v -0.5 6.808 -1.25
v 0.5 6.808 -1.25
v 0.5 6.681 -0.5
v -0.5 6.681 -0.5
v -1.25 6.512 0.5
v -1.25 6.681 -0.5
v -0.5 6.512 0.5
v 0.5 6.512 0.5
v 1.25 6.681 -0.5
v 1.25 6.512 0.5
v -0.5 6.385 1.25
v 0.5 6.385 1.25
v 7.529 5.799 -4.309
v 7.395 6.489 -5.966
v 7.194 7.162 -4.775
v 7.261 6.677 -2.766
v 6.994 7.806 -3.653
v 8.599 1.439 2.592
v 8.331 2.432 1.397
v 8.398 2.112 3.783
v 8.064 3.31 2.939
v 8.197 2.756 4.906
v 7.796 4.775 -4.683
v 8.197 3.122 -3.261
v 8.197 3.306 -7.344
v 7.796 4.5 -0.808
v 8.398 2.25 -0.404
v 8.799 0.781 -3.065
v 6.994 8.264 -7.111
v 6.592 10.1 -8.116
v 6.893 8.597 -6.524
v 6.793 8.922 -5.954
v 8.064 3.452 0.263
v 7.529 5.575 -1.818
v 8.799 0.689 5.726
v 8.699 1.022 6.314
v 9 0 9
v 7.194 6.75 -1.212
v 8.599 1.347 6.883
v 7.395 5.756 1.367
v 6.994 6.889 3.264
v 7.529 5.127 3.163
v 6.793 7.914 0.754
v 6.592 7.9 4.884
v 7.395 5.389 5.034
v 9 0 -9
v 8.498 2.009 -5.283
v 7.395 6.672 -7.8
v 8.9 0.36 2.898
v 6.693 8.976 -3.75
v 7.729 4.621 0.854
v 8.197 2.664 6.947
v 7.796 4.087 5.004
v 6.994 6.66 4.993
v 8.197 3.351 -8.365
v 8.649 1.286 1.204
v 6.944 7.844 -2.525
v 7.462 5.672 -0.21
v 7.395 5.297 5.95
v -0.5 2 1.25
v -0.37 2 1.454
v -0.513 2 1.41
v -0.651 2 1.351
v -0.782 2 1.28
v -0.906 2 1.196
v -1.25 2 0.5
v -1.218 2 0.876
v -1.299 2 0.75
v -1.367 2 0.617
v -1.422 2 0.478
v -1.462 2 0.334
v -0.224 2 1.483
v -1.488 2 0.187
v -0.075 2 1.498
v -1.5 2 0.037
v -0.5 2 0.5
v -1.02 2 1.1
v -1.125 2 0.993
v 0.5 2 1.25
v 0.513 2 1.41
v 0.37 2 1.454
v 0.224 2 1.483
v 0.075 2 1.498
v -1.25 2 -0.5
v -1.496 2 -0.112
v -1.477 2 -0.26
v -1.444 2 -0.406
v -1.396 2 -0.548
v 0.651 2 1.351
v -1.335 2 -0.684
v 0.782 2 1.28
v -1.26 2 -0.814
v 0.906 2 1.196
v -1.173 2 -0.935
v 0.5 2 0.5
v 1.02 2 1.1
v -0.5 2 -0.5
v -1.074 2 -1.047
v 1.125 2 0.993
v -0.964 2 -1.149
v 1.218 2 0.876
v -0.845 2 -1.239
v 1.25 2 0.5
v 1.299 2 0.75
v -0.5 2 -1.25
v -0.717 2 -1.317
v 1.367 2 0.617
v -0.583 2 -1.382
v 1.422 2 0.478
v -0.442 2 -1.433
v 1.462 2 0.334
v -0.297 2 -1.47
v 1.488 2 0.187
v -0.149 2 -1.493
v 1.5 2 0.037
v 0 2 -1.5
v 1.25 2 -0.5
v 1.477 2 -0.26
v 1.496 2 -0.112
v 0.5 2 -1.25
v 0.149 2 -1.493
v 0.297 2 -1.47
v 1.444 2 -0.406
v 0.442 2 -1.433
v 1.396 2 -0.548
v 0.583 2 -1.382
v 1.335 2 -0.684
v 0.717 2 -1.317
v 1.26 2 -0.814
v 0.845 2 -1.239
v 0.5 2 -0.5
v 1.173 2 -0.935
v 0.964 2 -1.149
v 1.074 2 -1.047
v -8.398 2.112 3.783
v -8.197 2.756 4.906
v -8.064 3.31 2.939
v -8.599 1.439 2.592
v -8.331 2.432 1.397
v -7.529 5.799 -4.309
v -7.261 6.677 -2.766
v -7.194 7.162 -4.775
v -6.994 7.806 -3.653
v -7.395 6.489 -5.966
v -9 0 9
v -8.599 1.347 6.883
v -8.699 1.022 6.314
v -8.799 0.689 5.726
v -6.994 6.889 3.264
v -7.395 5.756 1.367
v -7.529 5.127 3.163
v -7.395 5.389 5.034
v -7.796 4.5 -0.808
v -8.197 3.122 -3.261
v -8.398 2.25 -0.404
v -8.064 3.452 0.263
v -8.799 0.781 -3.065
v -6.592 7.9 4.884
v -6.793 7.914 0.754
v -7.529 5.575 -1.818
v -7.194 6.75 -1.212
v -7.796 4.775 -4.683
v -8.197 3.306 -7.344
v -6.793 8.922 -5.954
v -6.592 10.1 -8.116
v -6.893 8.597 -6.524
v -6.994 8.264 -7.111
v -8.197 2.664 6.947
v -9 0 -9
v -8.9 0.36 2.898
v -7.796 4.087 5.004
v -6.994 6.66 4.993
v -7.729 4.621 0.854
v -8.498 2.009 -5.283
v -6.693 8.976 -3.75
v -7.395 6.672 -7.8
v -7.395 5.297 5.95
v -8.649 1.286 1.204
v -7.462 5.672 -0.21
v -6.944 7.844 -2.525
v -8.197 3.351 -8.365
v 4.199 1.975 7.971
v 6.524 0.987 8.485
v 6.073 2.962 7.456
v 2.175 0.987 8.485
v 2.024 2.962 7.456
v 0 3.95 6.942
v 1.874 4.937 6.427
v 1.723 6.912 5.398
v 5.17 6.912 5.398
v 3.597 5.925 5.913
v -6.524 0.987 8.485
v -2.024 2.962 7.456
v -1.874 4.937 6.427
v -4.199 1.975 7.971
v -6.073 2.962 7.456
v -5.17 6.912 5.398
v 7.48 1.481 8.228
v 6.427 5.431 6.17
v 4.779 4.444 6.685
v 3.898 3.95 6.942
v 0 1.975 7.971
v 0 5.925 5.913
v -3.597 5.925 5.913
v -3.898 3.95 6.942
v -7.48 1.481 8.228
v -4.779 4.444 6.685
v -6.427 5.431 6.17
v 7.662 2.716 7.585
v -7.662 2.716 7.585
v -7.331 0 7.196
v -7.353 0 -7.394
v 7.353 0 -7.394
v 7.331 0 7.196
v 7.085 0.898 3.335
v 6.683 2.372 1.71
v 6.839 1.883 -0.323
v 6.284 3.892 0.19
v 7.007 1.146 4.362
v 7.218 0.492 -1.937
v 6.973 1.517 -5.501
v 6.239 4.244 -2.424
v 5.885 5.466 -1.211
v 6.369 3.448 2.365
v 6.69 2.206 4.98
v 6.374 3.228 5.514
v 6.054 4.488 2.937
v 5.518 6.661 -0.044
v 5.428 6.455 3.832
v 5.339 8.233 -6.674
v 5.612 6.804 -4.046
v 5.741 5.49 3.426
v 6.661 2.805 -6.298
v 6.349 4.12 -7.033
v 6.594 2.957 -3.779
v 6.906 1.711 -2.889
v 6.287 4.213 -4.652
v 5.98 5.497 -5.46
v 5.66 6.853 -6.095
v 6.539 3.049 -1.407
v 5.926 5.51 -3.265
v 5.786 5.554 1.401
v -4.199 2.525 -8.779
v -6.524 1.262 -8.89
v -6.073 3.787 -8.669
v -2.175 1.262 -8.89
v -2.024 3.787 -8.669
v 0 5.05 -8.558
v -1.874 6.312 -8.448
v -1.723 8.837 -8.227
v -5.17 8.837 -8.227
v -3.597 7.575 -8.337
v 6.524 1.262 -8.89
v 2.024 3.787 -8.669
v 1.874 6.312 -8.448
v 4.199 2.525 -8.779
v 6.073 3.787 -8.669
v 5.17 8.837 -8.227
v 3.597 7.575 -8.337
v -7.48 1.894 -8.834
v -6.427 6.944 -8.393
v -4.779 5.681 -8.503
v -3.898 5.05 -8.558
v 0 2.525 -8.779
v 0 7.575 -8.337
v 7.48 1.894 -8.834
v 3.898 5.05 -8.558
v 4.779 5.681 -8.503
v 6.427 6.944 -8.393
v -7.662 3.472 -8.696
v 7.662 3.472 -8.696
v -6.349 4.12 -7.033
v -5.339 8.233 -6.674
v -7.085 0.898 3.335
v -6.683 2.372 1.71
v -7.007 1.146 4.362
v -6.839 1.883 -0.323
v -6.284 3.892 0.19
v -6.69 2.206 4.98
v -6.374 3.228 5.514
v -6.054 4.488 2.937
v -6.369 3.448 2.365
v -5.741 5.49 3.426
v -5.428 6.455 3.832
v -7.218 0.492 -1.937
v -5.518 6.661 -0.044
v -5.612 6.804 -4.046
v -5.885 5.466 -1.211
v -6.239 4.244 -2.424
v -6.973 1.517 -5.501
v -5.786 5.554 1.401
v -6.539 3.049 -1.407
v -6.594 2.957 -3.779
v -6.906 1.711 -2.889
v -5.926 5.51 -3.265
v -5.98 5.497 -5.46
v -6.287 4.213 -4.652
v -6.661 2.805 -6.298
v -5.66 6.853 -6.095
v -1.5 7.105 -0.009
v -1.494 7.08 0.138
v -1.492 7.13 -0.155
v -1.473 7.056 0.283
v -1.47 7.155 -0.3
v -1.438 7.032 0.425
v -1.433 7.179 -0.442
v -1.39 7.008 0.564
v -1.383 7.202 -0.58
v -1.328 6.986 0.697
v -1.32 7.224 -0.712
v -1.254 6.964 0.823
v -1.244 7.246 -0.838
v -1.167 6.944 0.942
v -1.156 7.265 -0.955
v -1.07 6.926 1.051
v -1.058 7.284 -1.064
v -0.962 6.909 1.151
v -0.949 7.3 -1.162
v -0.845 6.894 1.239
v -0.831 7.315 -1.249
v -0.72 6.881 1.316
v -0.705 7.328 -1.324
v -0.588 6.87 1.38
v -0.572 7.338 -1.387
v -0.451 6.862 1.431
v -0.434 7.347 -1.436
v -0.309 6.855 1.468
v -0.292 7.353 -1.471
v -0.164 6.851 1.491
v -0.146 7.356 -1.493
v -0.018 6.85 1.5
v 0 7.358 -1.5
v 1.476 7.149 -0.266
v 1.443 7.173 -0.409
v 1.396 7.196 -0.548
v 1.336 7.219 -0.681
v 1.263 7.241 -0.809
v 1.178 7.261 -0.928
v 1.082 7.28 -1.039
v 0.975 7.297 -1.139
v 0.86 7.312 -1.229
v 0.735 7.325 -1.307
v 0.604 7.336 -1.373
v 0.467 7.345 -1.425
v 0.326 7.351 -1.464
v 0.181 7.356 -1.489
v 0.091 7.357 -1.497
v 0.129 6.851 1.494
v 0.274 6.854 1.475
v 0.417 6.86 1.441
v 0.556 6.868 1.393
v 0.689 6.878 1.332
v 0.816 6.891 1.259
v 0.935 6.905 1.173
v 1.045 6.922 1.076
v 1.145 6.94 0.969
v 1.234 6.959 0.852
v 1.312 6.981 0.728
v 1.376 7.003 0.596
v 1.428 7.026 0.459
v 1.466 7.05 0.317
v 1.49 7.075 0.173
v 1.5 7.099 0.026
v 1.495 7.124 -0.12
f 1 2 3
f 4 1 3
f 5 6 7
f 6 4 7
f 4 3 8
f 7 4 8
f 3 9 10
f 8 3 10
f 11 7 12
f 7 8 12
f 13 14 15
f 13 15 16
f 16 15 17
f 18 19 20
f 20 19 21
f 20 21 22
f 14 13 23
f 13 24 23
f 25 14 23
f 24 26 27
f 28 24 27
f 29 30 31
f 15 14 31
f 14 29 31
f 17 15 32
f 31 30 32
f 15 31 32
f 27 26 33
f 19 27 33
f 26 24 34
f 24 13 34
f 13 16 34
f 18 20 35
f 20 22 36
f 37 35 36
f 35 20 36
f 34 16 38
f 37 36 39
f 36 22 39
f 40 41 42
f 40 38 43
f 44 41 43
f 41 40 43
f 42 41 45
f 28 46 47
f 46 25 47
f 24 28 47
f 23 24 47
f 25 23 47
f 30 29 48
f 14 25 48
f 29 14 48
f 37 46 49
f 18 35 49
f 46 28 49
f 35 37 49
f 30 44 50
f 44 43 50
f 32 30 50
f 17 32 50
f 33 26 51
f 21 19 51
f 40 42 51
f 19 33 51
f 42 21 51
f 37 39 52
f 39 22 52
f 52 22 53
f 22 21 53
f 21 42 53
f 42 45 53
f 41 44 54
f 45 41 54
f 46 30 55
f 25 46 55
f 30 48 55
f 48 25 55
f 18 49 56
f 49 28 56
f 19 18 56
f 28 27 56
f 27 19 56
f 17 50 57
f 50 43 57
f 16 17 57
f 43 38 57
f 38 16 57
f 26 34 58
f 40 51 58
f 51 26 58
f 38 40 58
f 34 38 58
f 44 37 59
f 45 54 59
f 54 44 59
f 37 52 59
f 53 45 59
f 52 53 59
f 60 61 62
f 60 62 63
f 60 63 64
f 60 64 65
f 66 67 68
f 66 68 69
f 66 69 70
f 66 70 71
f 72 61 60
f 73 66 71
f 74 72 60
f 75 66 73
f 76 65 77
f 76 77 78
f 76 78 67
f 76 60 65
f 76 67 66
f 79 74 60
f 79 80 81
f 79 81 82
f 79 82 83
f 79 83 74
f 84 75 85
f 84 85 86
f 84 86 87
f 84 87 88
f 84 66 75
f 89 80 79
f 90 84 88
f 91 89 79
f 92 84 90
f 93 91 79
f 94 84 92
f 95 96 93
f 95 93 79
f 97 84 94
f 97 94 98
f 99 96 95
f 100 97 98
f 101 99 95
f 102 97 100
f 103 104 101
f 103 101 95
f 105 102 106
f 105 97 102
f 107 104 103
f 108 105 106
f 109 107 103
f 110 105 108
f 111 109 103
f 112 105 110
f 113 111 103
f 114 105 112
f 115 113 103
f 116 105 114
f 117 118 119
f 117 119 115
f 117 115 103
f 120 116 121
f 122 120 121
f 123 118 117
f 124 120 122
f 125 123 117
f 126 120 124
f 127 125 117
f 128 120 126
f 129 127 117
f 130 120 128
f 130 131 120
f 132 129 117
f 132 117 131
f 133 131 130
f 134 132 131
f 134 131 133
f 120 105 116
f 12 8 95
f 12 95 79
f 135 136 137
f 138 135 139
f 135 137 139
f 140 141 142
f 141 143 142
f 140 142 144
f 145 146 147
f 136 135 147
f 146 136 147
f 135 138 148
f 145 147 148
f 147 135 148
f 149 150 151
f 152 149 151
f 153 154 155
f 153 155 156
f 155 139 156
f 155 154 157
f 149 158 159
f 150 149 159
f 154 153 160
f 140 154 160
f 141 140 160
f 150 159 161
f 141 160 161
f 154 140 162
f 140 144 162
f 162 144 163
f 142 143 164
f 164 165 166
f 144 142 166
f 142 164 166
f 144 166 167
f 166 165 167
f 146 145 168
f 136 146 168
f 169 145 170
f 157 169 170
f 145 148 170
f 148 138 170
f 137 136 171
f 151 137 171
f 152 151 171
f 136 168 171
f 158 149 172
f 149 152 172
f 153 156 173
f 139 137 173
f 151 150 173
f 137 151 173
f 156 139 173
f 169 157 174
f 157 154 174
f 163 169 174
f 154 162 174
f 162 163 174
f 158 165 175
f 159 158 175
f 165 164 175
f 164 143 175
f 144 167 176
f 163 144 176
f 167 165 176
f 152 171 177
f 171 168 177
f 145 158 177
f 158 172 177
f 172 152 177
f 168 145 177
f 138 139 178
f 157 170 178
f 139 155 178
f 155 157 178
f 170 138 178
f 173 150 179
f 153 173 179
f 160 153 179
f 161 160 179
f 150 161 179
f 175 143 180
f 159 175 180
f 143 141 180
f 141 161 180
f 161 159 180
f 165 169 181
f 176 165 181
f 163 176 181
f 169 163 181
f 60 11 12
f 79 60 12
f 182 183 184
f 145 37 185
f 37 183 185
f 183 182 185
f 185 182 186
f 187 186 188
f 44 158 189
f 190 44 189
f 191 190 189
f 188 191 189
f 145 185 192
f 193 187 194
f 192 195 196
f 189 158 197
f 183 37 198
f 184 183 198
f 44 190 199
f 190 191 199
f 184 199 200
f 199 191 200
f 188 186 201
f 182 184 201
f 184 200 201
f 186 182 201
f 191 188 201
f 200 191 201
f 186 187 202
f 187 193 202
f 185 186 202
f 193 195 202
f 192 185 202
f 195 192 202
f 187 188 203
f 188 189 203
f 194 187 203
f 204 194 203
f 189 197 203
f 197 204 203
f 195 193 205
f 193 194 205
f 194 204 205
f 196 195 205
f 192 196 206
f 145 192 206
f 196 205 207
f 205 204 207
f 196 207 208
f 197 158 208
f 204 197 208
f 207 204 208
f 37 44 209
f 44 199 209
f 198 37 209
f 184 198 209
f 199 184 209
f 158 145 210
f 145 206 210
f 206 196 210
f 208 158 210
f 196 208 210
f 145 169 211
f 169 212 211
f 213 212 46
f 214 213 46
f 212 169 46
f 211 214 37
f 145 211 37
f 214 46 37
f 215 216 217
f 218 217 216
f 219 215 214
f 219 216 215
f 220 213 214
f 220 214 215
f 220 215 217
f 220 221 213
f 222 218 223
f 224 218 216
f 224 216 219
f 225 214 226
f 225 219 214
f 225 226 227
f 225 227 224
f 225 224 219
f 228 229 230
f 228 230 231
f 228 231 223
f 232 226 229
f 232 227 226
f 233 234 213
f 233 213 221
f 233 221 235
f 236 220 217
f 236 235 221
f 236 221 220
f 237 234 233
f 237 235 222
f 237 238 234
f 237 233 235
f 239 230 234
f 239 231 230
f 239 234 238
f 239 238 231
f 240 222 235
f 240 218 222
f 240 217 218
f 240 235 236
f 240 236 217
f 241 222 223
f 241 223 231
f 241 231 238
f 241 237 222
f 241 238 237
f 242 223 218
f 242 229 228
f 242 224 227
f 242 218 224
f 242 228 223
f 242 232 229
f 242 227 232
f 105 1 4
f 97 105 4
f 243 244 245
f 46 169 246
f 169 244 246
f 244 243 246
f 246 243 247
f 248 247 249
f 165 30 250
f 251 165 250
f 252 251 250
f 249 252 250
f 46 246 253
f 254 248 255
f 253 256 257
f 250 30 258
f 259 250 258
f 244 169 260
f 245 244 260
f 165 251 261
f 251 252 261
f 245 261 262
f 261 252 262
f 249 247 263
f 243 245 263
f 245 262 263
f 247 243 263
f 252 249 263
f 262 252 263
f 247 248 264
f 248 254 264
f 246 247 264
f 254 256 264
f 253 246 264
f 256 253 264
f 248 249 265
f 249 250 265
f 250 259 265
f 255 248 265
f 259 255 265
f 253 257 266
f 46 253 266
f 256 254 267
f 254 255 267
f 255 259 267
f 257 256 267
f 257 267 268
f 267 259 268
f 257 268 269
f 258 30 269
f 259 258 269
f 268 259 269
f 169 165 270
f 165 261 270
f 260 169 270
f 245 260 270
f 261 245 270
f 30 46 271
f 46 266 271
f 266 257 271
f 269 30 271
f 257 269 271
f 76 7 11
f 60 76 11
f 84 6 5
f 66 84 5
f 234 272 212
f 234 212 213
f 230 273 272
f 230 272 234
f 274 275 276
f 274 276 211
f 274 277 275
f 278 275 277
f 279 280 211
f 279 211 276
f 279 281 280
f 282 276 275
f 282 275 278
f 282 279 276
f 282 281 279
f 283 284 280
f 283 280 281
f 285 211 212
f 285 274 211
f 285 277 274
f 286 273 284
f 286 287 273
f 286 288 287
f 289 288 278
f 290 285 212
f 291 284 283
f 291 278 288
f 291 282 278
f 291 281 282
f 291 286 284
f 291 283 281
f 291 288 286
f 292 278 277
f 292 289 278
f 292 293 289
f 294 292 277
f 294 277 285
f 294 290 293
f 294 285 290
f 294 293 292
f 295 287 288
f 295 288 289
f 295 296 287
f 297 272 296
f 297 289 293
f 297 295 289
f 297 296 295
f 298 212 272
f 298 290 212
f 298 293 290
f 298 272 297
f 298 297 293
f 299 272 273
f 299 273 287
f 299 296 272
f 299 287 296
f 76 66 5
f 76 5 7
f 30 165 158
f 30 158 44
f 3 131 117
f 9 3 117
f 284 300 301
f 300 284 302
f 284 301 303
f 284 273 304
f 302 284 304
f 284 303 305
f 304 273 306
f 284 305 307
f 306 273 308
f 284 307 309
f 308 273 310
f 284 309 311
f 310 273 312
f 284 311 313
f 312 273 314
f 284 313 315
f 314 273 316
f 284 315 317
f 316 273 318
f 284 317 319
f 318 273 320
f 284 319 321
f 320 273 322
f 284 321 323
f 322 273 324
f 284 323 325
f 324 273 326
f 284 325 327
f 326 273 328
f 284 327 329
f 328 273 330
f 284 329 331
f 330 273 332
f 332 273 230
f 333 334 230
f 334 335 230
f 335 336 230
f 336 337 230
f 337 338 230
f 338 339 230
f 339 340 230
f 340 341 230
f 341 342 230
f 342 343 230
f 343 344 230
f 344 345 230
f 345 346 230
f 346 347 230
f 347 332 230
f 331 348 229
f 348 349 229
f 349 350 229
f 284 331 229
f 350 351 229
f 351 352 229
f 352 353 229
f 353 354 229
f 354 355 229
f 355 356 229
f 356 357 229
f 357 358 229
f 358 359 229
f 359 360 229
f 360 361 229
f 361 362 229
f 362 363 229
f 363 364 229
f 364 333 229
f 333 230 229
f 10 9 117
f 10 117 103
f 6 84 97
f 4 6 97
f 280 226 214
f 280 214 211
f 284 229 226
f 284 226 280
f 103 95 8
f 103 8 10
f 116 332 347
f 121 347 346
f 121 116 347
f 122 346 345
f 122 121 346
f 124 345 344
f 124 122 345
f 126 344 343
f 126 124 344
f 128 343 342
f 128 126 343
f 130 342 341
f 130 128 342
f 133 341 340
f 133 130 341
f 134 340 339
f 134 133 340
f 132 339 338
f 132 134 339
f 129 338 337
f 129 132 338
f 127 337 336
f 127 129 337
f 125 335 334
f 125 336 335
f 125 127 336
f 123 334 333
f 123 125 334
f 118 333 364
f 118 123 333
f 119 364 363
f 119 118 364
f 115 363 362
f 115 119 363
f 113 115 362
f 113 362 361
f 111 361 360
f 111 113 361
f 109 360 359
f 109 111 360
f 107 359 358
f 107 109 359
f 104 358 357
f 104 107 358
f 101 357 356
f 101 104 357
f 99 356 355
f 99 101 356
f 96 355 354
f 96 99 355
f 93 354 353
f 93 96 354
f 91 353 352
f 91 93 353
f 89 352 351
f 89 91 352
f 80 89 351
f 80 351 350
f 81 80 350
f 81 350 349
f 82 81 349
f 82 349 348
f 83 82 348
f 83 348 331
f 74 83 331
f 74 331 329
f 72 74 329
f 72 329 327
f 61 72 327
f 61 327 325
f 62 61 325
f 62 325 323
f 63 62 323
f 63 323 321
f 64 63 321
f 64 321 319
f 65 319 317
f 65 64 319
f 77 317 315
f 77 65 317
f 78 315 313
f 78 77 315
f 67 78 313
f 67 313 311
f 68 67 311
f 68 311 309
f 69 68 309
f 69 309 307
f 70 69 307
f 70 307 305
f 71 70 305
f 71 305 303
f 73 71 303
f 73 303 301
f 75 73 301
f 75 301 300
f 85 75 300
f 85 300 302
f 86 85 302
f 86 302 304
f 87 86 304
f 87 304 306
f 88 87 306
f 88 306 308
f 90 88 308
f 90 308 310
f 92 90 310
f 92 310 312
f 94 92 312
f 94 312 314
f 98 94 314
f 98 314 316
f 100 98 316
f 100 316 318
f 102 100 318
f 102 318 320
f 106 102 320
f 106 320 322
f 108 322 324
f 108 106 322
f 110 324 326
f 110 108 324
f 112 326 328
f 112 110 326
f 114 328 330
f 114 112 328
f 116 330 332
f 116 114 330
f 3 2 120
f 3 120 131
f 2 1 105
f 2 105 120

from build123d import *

# Parameters (mm, degrees)
SHELL1_T            = -1.6
BOSS_EXTRUDE1_REACH = 20.248
BOSS_EXTRUDE1_START = -2
SKETCH4_R           = 1.5
CUT_EXTRUDE1_REACH  = 17.087
SKETCH5_W           = 0.75
SKETCH5_H           = 1
SKETCH5_W_2         = 1
SKETCH5_H_2         = 0.75


with BuildPart() as part:
    # Sketch1 → Loft1 section 0
    with BuildSketch(Plane(origin=(0, 0, 0), x_dir=(1, 0, 0), z_dir=(0, 1, 0))):
        with BuildLine():
            Line((-9, 9), (9, 9))
            Line((9, 9), (9, -9))
            Line((9, -9), (-9, -9))
            Line((-9, -9), (-9, 9))
        make_face()
    # Sketch3 → Loft1 section 1
    with BuildSketch(Plane(origin=(0, 8.483501929, 1.435669557), x_dir=(0, 0.16685830369290802, -0.9859808854580931), z_dir=(0, 0.9859808854580931, 0.16685830369290802))):
        with BuildLine():
            Line((-3.496990657, 6.59241989), (9.687849122, 6.59241989))
            Line((9.687849122, 6.59241989), (9.687849122, -6.59241989))
            Line((9.687849122, -6.59241989), (-3.496990657, -6.59241989))
            Line((-3.496990657, -6.59241989), (-3.496990657, 6.59241989))
        make_face()
    loft()

    # Shell1
    shell1_openings = [part.faces().sort_by_distance(p)[0] for p in [
        (0, 0, 0),
    ]]
    offset(amount=SHELL1_T, openings=shell1_openings, kind=Kind.INTERSECTION)

    # Boss-Extrude1: up to this plane
    boss_extrude1_end = Plane(origin=(0, 6.905932512, 1.168696271), z_dir=(0, 0.9859808854580933, 0.16685830369290802))
    # Sketch4 → Boss-Extrude1 (add, up to the surface)
    with BuildSketch(Plane.XZ.offset(BOSS_EXTRUDE1_START), mode=Mode.PRIVATE) as boss_extrude1_sk1:
        with Locations(Location((0, 0, 0), (0, 0, 270))):
            Circle(SKETCH4_R)
    boss_extrude1_tool1 = split(extrude(boss_extrude1_sk1.sketch, amount=-BOSS_EXTRUDE1_REACH, mode=Mode.PRIVATE), bisect_by=boss_extrude1_end, keep=Keep.BOTH, mode=Mode.PRIVATE)
    add(boss_extrude1_tool1.solids().sort_by_distance((0, 2, 0))[0])

    # Cut-Extrude1: up to this plane
    cut_extrude1_end = Plane(origin=(0, 6.41294207, 1.085267119), z_dir=(0, 0.9859808854580933, 0.16685830369290802))
    # Sketch5 → Cut-Extrude1 (cut, up to the surface)
    with BuildSketch(Plane.XZ.offset(-2), mode=Mode.PRIVATE) as cut_extrude1_sk1:
        with Locations((-0.875, 0)):
            Rectangle(SKETCH5_W, SKETCH5_H)
    cut_extrude1_tool1 = split(extrude(cut_extrude1_sk1.sketch, amount=-CUT_EXTRUDE1_REACH, mode=Mode.PRIVATE), bisect_by=cut_extrude1_end, keep=Keep.BOTH, mode=Mode.PRIVATE)
    add(cut_extrude1_tool1.solids().sort_by_distance((-0.875, 2, 0))[0], mode=Mode.SUBTRACT)
    # Sketch5 → Cut-Extrude1 (cut, up to the surface)
    with BuildSketch(Plane.XZ.offset(-2), mode=Mode.PRIVATE) as cut_extrude1_sk2:
        Rectangle(SKETCH5_W_2, SKETCH5_H)
    cut_extrude1_tool2 = split(extrude(cut_extrude1_sk2.sketch, amount=-CUT_EXTRUDE1_REACH, mode=Mode.PRIVATE), bisect_by=cut_extrude1_end, keep=Keep.BOTH, mode=Mode.PRIVATE)
    add(cut_extrude1_tool2.solids().sort_by_distance((0, 2, 0))[0], mode=Mode.SUBTRACT)
    # Sketch5 → Cut-Extrude1 (cut, up to the surface)
    with BuildSketch(Plane.XZ.offset(-2), mode=Mode.PRIVATE) as cut_extrude1_sk3:
        with Locations((0, 0.875)):
            Rectangle(SKETCH5_W_2, SKETCH5_H_2)
    cut_extrude1_tool3 = split(extrude(cut_extrude1_sk3.sketch, amount=-CUT_EXTRUDE1_REACH, mode=Mode.PRIVATE), bisect_by=cut_extrude1_end, keep=Keep.BOTH, mode=Mode.PRIVATE)
    add(cut_extrude1_tool3.solids().sort_by_distance((0, 2, 0.875))[0], mode=Mode.SUBTRACT)
    # Sketch5 → Cut-Extrude1 (cut, up to the surface)
    with BuildSketch(Plane.XZ.offset(-2), mode=Mode.PRIVATE) as cut_extrude1_sk4:
        with Locations((0.875, 0)):
            Rectangle(SKETCH5_W, SKETCH5_H)
    cut_extrude1_tool4 = split(extrude(cut_extrude1_sk4.sketch, amount=-CUT_EXTRUDE1_REACH, mode=Mode.PRIVATE), bisect_by=cut_extrude1_end, keep=Keep.BOTH, mode=Mode.PRIVATE)
    add(cut_extrude1_tool4.solids().sort_by_distance((0.875, 2, 0))[0], mode=Mode.SUBTRACT)
    # Sketch5 → Cut-Extrude1 (cut, up to the surface)
    with BuildSketch(Plane.XZ.offset(-2), mode=Mode.PRIVATE) as cut_extrude1_sk5:
        with Locations((0, -0.875)):
            Rectangle(SKETCH5_W_2, SKETCH5_H_2)
    cut_extrude1_tool5 = split(extrude(cut_extrude1_sk5.sketch, amount=-CUT_EXTRUDE1_REACH, mode=Mode.PRIVATE), bisect_by=cut_extrude1_end, keep=Keep.BOTH, mode=Mode.PRIVATE)
    add(cut_extrude1_tool5.solids().sort_by_distance((0, 2, -0.875))[0], mode=Mode.SUBTRACT)


solid = part.part
